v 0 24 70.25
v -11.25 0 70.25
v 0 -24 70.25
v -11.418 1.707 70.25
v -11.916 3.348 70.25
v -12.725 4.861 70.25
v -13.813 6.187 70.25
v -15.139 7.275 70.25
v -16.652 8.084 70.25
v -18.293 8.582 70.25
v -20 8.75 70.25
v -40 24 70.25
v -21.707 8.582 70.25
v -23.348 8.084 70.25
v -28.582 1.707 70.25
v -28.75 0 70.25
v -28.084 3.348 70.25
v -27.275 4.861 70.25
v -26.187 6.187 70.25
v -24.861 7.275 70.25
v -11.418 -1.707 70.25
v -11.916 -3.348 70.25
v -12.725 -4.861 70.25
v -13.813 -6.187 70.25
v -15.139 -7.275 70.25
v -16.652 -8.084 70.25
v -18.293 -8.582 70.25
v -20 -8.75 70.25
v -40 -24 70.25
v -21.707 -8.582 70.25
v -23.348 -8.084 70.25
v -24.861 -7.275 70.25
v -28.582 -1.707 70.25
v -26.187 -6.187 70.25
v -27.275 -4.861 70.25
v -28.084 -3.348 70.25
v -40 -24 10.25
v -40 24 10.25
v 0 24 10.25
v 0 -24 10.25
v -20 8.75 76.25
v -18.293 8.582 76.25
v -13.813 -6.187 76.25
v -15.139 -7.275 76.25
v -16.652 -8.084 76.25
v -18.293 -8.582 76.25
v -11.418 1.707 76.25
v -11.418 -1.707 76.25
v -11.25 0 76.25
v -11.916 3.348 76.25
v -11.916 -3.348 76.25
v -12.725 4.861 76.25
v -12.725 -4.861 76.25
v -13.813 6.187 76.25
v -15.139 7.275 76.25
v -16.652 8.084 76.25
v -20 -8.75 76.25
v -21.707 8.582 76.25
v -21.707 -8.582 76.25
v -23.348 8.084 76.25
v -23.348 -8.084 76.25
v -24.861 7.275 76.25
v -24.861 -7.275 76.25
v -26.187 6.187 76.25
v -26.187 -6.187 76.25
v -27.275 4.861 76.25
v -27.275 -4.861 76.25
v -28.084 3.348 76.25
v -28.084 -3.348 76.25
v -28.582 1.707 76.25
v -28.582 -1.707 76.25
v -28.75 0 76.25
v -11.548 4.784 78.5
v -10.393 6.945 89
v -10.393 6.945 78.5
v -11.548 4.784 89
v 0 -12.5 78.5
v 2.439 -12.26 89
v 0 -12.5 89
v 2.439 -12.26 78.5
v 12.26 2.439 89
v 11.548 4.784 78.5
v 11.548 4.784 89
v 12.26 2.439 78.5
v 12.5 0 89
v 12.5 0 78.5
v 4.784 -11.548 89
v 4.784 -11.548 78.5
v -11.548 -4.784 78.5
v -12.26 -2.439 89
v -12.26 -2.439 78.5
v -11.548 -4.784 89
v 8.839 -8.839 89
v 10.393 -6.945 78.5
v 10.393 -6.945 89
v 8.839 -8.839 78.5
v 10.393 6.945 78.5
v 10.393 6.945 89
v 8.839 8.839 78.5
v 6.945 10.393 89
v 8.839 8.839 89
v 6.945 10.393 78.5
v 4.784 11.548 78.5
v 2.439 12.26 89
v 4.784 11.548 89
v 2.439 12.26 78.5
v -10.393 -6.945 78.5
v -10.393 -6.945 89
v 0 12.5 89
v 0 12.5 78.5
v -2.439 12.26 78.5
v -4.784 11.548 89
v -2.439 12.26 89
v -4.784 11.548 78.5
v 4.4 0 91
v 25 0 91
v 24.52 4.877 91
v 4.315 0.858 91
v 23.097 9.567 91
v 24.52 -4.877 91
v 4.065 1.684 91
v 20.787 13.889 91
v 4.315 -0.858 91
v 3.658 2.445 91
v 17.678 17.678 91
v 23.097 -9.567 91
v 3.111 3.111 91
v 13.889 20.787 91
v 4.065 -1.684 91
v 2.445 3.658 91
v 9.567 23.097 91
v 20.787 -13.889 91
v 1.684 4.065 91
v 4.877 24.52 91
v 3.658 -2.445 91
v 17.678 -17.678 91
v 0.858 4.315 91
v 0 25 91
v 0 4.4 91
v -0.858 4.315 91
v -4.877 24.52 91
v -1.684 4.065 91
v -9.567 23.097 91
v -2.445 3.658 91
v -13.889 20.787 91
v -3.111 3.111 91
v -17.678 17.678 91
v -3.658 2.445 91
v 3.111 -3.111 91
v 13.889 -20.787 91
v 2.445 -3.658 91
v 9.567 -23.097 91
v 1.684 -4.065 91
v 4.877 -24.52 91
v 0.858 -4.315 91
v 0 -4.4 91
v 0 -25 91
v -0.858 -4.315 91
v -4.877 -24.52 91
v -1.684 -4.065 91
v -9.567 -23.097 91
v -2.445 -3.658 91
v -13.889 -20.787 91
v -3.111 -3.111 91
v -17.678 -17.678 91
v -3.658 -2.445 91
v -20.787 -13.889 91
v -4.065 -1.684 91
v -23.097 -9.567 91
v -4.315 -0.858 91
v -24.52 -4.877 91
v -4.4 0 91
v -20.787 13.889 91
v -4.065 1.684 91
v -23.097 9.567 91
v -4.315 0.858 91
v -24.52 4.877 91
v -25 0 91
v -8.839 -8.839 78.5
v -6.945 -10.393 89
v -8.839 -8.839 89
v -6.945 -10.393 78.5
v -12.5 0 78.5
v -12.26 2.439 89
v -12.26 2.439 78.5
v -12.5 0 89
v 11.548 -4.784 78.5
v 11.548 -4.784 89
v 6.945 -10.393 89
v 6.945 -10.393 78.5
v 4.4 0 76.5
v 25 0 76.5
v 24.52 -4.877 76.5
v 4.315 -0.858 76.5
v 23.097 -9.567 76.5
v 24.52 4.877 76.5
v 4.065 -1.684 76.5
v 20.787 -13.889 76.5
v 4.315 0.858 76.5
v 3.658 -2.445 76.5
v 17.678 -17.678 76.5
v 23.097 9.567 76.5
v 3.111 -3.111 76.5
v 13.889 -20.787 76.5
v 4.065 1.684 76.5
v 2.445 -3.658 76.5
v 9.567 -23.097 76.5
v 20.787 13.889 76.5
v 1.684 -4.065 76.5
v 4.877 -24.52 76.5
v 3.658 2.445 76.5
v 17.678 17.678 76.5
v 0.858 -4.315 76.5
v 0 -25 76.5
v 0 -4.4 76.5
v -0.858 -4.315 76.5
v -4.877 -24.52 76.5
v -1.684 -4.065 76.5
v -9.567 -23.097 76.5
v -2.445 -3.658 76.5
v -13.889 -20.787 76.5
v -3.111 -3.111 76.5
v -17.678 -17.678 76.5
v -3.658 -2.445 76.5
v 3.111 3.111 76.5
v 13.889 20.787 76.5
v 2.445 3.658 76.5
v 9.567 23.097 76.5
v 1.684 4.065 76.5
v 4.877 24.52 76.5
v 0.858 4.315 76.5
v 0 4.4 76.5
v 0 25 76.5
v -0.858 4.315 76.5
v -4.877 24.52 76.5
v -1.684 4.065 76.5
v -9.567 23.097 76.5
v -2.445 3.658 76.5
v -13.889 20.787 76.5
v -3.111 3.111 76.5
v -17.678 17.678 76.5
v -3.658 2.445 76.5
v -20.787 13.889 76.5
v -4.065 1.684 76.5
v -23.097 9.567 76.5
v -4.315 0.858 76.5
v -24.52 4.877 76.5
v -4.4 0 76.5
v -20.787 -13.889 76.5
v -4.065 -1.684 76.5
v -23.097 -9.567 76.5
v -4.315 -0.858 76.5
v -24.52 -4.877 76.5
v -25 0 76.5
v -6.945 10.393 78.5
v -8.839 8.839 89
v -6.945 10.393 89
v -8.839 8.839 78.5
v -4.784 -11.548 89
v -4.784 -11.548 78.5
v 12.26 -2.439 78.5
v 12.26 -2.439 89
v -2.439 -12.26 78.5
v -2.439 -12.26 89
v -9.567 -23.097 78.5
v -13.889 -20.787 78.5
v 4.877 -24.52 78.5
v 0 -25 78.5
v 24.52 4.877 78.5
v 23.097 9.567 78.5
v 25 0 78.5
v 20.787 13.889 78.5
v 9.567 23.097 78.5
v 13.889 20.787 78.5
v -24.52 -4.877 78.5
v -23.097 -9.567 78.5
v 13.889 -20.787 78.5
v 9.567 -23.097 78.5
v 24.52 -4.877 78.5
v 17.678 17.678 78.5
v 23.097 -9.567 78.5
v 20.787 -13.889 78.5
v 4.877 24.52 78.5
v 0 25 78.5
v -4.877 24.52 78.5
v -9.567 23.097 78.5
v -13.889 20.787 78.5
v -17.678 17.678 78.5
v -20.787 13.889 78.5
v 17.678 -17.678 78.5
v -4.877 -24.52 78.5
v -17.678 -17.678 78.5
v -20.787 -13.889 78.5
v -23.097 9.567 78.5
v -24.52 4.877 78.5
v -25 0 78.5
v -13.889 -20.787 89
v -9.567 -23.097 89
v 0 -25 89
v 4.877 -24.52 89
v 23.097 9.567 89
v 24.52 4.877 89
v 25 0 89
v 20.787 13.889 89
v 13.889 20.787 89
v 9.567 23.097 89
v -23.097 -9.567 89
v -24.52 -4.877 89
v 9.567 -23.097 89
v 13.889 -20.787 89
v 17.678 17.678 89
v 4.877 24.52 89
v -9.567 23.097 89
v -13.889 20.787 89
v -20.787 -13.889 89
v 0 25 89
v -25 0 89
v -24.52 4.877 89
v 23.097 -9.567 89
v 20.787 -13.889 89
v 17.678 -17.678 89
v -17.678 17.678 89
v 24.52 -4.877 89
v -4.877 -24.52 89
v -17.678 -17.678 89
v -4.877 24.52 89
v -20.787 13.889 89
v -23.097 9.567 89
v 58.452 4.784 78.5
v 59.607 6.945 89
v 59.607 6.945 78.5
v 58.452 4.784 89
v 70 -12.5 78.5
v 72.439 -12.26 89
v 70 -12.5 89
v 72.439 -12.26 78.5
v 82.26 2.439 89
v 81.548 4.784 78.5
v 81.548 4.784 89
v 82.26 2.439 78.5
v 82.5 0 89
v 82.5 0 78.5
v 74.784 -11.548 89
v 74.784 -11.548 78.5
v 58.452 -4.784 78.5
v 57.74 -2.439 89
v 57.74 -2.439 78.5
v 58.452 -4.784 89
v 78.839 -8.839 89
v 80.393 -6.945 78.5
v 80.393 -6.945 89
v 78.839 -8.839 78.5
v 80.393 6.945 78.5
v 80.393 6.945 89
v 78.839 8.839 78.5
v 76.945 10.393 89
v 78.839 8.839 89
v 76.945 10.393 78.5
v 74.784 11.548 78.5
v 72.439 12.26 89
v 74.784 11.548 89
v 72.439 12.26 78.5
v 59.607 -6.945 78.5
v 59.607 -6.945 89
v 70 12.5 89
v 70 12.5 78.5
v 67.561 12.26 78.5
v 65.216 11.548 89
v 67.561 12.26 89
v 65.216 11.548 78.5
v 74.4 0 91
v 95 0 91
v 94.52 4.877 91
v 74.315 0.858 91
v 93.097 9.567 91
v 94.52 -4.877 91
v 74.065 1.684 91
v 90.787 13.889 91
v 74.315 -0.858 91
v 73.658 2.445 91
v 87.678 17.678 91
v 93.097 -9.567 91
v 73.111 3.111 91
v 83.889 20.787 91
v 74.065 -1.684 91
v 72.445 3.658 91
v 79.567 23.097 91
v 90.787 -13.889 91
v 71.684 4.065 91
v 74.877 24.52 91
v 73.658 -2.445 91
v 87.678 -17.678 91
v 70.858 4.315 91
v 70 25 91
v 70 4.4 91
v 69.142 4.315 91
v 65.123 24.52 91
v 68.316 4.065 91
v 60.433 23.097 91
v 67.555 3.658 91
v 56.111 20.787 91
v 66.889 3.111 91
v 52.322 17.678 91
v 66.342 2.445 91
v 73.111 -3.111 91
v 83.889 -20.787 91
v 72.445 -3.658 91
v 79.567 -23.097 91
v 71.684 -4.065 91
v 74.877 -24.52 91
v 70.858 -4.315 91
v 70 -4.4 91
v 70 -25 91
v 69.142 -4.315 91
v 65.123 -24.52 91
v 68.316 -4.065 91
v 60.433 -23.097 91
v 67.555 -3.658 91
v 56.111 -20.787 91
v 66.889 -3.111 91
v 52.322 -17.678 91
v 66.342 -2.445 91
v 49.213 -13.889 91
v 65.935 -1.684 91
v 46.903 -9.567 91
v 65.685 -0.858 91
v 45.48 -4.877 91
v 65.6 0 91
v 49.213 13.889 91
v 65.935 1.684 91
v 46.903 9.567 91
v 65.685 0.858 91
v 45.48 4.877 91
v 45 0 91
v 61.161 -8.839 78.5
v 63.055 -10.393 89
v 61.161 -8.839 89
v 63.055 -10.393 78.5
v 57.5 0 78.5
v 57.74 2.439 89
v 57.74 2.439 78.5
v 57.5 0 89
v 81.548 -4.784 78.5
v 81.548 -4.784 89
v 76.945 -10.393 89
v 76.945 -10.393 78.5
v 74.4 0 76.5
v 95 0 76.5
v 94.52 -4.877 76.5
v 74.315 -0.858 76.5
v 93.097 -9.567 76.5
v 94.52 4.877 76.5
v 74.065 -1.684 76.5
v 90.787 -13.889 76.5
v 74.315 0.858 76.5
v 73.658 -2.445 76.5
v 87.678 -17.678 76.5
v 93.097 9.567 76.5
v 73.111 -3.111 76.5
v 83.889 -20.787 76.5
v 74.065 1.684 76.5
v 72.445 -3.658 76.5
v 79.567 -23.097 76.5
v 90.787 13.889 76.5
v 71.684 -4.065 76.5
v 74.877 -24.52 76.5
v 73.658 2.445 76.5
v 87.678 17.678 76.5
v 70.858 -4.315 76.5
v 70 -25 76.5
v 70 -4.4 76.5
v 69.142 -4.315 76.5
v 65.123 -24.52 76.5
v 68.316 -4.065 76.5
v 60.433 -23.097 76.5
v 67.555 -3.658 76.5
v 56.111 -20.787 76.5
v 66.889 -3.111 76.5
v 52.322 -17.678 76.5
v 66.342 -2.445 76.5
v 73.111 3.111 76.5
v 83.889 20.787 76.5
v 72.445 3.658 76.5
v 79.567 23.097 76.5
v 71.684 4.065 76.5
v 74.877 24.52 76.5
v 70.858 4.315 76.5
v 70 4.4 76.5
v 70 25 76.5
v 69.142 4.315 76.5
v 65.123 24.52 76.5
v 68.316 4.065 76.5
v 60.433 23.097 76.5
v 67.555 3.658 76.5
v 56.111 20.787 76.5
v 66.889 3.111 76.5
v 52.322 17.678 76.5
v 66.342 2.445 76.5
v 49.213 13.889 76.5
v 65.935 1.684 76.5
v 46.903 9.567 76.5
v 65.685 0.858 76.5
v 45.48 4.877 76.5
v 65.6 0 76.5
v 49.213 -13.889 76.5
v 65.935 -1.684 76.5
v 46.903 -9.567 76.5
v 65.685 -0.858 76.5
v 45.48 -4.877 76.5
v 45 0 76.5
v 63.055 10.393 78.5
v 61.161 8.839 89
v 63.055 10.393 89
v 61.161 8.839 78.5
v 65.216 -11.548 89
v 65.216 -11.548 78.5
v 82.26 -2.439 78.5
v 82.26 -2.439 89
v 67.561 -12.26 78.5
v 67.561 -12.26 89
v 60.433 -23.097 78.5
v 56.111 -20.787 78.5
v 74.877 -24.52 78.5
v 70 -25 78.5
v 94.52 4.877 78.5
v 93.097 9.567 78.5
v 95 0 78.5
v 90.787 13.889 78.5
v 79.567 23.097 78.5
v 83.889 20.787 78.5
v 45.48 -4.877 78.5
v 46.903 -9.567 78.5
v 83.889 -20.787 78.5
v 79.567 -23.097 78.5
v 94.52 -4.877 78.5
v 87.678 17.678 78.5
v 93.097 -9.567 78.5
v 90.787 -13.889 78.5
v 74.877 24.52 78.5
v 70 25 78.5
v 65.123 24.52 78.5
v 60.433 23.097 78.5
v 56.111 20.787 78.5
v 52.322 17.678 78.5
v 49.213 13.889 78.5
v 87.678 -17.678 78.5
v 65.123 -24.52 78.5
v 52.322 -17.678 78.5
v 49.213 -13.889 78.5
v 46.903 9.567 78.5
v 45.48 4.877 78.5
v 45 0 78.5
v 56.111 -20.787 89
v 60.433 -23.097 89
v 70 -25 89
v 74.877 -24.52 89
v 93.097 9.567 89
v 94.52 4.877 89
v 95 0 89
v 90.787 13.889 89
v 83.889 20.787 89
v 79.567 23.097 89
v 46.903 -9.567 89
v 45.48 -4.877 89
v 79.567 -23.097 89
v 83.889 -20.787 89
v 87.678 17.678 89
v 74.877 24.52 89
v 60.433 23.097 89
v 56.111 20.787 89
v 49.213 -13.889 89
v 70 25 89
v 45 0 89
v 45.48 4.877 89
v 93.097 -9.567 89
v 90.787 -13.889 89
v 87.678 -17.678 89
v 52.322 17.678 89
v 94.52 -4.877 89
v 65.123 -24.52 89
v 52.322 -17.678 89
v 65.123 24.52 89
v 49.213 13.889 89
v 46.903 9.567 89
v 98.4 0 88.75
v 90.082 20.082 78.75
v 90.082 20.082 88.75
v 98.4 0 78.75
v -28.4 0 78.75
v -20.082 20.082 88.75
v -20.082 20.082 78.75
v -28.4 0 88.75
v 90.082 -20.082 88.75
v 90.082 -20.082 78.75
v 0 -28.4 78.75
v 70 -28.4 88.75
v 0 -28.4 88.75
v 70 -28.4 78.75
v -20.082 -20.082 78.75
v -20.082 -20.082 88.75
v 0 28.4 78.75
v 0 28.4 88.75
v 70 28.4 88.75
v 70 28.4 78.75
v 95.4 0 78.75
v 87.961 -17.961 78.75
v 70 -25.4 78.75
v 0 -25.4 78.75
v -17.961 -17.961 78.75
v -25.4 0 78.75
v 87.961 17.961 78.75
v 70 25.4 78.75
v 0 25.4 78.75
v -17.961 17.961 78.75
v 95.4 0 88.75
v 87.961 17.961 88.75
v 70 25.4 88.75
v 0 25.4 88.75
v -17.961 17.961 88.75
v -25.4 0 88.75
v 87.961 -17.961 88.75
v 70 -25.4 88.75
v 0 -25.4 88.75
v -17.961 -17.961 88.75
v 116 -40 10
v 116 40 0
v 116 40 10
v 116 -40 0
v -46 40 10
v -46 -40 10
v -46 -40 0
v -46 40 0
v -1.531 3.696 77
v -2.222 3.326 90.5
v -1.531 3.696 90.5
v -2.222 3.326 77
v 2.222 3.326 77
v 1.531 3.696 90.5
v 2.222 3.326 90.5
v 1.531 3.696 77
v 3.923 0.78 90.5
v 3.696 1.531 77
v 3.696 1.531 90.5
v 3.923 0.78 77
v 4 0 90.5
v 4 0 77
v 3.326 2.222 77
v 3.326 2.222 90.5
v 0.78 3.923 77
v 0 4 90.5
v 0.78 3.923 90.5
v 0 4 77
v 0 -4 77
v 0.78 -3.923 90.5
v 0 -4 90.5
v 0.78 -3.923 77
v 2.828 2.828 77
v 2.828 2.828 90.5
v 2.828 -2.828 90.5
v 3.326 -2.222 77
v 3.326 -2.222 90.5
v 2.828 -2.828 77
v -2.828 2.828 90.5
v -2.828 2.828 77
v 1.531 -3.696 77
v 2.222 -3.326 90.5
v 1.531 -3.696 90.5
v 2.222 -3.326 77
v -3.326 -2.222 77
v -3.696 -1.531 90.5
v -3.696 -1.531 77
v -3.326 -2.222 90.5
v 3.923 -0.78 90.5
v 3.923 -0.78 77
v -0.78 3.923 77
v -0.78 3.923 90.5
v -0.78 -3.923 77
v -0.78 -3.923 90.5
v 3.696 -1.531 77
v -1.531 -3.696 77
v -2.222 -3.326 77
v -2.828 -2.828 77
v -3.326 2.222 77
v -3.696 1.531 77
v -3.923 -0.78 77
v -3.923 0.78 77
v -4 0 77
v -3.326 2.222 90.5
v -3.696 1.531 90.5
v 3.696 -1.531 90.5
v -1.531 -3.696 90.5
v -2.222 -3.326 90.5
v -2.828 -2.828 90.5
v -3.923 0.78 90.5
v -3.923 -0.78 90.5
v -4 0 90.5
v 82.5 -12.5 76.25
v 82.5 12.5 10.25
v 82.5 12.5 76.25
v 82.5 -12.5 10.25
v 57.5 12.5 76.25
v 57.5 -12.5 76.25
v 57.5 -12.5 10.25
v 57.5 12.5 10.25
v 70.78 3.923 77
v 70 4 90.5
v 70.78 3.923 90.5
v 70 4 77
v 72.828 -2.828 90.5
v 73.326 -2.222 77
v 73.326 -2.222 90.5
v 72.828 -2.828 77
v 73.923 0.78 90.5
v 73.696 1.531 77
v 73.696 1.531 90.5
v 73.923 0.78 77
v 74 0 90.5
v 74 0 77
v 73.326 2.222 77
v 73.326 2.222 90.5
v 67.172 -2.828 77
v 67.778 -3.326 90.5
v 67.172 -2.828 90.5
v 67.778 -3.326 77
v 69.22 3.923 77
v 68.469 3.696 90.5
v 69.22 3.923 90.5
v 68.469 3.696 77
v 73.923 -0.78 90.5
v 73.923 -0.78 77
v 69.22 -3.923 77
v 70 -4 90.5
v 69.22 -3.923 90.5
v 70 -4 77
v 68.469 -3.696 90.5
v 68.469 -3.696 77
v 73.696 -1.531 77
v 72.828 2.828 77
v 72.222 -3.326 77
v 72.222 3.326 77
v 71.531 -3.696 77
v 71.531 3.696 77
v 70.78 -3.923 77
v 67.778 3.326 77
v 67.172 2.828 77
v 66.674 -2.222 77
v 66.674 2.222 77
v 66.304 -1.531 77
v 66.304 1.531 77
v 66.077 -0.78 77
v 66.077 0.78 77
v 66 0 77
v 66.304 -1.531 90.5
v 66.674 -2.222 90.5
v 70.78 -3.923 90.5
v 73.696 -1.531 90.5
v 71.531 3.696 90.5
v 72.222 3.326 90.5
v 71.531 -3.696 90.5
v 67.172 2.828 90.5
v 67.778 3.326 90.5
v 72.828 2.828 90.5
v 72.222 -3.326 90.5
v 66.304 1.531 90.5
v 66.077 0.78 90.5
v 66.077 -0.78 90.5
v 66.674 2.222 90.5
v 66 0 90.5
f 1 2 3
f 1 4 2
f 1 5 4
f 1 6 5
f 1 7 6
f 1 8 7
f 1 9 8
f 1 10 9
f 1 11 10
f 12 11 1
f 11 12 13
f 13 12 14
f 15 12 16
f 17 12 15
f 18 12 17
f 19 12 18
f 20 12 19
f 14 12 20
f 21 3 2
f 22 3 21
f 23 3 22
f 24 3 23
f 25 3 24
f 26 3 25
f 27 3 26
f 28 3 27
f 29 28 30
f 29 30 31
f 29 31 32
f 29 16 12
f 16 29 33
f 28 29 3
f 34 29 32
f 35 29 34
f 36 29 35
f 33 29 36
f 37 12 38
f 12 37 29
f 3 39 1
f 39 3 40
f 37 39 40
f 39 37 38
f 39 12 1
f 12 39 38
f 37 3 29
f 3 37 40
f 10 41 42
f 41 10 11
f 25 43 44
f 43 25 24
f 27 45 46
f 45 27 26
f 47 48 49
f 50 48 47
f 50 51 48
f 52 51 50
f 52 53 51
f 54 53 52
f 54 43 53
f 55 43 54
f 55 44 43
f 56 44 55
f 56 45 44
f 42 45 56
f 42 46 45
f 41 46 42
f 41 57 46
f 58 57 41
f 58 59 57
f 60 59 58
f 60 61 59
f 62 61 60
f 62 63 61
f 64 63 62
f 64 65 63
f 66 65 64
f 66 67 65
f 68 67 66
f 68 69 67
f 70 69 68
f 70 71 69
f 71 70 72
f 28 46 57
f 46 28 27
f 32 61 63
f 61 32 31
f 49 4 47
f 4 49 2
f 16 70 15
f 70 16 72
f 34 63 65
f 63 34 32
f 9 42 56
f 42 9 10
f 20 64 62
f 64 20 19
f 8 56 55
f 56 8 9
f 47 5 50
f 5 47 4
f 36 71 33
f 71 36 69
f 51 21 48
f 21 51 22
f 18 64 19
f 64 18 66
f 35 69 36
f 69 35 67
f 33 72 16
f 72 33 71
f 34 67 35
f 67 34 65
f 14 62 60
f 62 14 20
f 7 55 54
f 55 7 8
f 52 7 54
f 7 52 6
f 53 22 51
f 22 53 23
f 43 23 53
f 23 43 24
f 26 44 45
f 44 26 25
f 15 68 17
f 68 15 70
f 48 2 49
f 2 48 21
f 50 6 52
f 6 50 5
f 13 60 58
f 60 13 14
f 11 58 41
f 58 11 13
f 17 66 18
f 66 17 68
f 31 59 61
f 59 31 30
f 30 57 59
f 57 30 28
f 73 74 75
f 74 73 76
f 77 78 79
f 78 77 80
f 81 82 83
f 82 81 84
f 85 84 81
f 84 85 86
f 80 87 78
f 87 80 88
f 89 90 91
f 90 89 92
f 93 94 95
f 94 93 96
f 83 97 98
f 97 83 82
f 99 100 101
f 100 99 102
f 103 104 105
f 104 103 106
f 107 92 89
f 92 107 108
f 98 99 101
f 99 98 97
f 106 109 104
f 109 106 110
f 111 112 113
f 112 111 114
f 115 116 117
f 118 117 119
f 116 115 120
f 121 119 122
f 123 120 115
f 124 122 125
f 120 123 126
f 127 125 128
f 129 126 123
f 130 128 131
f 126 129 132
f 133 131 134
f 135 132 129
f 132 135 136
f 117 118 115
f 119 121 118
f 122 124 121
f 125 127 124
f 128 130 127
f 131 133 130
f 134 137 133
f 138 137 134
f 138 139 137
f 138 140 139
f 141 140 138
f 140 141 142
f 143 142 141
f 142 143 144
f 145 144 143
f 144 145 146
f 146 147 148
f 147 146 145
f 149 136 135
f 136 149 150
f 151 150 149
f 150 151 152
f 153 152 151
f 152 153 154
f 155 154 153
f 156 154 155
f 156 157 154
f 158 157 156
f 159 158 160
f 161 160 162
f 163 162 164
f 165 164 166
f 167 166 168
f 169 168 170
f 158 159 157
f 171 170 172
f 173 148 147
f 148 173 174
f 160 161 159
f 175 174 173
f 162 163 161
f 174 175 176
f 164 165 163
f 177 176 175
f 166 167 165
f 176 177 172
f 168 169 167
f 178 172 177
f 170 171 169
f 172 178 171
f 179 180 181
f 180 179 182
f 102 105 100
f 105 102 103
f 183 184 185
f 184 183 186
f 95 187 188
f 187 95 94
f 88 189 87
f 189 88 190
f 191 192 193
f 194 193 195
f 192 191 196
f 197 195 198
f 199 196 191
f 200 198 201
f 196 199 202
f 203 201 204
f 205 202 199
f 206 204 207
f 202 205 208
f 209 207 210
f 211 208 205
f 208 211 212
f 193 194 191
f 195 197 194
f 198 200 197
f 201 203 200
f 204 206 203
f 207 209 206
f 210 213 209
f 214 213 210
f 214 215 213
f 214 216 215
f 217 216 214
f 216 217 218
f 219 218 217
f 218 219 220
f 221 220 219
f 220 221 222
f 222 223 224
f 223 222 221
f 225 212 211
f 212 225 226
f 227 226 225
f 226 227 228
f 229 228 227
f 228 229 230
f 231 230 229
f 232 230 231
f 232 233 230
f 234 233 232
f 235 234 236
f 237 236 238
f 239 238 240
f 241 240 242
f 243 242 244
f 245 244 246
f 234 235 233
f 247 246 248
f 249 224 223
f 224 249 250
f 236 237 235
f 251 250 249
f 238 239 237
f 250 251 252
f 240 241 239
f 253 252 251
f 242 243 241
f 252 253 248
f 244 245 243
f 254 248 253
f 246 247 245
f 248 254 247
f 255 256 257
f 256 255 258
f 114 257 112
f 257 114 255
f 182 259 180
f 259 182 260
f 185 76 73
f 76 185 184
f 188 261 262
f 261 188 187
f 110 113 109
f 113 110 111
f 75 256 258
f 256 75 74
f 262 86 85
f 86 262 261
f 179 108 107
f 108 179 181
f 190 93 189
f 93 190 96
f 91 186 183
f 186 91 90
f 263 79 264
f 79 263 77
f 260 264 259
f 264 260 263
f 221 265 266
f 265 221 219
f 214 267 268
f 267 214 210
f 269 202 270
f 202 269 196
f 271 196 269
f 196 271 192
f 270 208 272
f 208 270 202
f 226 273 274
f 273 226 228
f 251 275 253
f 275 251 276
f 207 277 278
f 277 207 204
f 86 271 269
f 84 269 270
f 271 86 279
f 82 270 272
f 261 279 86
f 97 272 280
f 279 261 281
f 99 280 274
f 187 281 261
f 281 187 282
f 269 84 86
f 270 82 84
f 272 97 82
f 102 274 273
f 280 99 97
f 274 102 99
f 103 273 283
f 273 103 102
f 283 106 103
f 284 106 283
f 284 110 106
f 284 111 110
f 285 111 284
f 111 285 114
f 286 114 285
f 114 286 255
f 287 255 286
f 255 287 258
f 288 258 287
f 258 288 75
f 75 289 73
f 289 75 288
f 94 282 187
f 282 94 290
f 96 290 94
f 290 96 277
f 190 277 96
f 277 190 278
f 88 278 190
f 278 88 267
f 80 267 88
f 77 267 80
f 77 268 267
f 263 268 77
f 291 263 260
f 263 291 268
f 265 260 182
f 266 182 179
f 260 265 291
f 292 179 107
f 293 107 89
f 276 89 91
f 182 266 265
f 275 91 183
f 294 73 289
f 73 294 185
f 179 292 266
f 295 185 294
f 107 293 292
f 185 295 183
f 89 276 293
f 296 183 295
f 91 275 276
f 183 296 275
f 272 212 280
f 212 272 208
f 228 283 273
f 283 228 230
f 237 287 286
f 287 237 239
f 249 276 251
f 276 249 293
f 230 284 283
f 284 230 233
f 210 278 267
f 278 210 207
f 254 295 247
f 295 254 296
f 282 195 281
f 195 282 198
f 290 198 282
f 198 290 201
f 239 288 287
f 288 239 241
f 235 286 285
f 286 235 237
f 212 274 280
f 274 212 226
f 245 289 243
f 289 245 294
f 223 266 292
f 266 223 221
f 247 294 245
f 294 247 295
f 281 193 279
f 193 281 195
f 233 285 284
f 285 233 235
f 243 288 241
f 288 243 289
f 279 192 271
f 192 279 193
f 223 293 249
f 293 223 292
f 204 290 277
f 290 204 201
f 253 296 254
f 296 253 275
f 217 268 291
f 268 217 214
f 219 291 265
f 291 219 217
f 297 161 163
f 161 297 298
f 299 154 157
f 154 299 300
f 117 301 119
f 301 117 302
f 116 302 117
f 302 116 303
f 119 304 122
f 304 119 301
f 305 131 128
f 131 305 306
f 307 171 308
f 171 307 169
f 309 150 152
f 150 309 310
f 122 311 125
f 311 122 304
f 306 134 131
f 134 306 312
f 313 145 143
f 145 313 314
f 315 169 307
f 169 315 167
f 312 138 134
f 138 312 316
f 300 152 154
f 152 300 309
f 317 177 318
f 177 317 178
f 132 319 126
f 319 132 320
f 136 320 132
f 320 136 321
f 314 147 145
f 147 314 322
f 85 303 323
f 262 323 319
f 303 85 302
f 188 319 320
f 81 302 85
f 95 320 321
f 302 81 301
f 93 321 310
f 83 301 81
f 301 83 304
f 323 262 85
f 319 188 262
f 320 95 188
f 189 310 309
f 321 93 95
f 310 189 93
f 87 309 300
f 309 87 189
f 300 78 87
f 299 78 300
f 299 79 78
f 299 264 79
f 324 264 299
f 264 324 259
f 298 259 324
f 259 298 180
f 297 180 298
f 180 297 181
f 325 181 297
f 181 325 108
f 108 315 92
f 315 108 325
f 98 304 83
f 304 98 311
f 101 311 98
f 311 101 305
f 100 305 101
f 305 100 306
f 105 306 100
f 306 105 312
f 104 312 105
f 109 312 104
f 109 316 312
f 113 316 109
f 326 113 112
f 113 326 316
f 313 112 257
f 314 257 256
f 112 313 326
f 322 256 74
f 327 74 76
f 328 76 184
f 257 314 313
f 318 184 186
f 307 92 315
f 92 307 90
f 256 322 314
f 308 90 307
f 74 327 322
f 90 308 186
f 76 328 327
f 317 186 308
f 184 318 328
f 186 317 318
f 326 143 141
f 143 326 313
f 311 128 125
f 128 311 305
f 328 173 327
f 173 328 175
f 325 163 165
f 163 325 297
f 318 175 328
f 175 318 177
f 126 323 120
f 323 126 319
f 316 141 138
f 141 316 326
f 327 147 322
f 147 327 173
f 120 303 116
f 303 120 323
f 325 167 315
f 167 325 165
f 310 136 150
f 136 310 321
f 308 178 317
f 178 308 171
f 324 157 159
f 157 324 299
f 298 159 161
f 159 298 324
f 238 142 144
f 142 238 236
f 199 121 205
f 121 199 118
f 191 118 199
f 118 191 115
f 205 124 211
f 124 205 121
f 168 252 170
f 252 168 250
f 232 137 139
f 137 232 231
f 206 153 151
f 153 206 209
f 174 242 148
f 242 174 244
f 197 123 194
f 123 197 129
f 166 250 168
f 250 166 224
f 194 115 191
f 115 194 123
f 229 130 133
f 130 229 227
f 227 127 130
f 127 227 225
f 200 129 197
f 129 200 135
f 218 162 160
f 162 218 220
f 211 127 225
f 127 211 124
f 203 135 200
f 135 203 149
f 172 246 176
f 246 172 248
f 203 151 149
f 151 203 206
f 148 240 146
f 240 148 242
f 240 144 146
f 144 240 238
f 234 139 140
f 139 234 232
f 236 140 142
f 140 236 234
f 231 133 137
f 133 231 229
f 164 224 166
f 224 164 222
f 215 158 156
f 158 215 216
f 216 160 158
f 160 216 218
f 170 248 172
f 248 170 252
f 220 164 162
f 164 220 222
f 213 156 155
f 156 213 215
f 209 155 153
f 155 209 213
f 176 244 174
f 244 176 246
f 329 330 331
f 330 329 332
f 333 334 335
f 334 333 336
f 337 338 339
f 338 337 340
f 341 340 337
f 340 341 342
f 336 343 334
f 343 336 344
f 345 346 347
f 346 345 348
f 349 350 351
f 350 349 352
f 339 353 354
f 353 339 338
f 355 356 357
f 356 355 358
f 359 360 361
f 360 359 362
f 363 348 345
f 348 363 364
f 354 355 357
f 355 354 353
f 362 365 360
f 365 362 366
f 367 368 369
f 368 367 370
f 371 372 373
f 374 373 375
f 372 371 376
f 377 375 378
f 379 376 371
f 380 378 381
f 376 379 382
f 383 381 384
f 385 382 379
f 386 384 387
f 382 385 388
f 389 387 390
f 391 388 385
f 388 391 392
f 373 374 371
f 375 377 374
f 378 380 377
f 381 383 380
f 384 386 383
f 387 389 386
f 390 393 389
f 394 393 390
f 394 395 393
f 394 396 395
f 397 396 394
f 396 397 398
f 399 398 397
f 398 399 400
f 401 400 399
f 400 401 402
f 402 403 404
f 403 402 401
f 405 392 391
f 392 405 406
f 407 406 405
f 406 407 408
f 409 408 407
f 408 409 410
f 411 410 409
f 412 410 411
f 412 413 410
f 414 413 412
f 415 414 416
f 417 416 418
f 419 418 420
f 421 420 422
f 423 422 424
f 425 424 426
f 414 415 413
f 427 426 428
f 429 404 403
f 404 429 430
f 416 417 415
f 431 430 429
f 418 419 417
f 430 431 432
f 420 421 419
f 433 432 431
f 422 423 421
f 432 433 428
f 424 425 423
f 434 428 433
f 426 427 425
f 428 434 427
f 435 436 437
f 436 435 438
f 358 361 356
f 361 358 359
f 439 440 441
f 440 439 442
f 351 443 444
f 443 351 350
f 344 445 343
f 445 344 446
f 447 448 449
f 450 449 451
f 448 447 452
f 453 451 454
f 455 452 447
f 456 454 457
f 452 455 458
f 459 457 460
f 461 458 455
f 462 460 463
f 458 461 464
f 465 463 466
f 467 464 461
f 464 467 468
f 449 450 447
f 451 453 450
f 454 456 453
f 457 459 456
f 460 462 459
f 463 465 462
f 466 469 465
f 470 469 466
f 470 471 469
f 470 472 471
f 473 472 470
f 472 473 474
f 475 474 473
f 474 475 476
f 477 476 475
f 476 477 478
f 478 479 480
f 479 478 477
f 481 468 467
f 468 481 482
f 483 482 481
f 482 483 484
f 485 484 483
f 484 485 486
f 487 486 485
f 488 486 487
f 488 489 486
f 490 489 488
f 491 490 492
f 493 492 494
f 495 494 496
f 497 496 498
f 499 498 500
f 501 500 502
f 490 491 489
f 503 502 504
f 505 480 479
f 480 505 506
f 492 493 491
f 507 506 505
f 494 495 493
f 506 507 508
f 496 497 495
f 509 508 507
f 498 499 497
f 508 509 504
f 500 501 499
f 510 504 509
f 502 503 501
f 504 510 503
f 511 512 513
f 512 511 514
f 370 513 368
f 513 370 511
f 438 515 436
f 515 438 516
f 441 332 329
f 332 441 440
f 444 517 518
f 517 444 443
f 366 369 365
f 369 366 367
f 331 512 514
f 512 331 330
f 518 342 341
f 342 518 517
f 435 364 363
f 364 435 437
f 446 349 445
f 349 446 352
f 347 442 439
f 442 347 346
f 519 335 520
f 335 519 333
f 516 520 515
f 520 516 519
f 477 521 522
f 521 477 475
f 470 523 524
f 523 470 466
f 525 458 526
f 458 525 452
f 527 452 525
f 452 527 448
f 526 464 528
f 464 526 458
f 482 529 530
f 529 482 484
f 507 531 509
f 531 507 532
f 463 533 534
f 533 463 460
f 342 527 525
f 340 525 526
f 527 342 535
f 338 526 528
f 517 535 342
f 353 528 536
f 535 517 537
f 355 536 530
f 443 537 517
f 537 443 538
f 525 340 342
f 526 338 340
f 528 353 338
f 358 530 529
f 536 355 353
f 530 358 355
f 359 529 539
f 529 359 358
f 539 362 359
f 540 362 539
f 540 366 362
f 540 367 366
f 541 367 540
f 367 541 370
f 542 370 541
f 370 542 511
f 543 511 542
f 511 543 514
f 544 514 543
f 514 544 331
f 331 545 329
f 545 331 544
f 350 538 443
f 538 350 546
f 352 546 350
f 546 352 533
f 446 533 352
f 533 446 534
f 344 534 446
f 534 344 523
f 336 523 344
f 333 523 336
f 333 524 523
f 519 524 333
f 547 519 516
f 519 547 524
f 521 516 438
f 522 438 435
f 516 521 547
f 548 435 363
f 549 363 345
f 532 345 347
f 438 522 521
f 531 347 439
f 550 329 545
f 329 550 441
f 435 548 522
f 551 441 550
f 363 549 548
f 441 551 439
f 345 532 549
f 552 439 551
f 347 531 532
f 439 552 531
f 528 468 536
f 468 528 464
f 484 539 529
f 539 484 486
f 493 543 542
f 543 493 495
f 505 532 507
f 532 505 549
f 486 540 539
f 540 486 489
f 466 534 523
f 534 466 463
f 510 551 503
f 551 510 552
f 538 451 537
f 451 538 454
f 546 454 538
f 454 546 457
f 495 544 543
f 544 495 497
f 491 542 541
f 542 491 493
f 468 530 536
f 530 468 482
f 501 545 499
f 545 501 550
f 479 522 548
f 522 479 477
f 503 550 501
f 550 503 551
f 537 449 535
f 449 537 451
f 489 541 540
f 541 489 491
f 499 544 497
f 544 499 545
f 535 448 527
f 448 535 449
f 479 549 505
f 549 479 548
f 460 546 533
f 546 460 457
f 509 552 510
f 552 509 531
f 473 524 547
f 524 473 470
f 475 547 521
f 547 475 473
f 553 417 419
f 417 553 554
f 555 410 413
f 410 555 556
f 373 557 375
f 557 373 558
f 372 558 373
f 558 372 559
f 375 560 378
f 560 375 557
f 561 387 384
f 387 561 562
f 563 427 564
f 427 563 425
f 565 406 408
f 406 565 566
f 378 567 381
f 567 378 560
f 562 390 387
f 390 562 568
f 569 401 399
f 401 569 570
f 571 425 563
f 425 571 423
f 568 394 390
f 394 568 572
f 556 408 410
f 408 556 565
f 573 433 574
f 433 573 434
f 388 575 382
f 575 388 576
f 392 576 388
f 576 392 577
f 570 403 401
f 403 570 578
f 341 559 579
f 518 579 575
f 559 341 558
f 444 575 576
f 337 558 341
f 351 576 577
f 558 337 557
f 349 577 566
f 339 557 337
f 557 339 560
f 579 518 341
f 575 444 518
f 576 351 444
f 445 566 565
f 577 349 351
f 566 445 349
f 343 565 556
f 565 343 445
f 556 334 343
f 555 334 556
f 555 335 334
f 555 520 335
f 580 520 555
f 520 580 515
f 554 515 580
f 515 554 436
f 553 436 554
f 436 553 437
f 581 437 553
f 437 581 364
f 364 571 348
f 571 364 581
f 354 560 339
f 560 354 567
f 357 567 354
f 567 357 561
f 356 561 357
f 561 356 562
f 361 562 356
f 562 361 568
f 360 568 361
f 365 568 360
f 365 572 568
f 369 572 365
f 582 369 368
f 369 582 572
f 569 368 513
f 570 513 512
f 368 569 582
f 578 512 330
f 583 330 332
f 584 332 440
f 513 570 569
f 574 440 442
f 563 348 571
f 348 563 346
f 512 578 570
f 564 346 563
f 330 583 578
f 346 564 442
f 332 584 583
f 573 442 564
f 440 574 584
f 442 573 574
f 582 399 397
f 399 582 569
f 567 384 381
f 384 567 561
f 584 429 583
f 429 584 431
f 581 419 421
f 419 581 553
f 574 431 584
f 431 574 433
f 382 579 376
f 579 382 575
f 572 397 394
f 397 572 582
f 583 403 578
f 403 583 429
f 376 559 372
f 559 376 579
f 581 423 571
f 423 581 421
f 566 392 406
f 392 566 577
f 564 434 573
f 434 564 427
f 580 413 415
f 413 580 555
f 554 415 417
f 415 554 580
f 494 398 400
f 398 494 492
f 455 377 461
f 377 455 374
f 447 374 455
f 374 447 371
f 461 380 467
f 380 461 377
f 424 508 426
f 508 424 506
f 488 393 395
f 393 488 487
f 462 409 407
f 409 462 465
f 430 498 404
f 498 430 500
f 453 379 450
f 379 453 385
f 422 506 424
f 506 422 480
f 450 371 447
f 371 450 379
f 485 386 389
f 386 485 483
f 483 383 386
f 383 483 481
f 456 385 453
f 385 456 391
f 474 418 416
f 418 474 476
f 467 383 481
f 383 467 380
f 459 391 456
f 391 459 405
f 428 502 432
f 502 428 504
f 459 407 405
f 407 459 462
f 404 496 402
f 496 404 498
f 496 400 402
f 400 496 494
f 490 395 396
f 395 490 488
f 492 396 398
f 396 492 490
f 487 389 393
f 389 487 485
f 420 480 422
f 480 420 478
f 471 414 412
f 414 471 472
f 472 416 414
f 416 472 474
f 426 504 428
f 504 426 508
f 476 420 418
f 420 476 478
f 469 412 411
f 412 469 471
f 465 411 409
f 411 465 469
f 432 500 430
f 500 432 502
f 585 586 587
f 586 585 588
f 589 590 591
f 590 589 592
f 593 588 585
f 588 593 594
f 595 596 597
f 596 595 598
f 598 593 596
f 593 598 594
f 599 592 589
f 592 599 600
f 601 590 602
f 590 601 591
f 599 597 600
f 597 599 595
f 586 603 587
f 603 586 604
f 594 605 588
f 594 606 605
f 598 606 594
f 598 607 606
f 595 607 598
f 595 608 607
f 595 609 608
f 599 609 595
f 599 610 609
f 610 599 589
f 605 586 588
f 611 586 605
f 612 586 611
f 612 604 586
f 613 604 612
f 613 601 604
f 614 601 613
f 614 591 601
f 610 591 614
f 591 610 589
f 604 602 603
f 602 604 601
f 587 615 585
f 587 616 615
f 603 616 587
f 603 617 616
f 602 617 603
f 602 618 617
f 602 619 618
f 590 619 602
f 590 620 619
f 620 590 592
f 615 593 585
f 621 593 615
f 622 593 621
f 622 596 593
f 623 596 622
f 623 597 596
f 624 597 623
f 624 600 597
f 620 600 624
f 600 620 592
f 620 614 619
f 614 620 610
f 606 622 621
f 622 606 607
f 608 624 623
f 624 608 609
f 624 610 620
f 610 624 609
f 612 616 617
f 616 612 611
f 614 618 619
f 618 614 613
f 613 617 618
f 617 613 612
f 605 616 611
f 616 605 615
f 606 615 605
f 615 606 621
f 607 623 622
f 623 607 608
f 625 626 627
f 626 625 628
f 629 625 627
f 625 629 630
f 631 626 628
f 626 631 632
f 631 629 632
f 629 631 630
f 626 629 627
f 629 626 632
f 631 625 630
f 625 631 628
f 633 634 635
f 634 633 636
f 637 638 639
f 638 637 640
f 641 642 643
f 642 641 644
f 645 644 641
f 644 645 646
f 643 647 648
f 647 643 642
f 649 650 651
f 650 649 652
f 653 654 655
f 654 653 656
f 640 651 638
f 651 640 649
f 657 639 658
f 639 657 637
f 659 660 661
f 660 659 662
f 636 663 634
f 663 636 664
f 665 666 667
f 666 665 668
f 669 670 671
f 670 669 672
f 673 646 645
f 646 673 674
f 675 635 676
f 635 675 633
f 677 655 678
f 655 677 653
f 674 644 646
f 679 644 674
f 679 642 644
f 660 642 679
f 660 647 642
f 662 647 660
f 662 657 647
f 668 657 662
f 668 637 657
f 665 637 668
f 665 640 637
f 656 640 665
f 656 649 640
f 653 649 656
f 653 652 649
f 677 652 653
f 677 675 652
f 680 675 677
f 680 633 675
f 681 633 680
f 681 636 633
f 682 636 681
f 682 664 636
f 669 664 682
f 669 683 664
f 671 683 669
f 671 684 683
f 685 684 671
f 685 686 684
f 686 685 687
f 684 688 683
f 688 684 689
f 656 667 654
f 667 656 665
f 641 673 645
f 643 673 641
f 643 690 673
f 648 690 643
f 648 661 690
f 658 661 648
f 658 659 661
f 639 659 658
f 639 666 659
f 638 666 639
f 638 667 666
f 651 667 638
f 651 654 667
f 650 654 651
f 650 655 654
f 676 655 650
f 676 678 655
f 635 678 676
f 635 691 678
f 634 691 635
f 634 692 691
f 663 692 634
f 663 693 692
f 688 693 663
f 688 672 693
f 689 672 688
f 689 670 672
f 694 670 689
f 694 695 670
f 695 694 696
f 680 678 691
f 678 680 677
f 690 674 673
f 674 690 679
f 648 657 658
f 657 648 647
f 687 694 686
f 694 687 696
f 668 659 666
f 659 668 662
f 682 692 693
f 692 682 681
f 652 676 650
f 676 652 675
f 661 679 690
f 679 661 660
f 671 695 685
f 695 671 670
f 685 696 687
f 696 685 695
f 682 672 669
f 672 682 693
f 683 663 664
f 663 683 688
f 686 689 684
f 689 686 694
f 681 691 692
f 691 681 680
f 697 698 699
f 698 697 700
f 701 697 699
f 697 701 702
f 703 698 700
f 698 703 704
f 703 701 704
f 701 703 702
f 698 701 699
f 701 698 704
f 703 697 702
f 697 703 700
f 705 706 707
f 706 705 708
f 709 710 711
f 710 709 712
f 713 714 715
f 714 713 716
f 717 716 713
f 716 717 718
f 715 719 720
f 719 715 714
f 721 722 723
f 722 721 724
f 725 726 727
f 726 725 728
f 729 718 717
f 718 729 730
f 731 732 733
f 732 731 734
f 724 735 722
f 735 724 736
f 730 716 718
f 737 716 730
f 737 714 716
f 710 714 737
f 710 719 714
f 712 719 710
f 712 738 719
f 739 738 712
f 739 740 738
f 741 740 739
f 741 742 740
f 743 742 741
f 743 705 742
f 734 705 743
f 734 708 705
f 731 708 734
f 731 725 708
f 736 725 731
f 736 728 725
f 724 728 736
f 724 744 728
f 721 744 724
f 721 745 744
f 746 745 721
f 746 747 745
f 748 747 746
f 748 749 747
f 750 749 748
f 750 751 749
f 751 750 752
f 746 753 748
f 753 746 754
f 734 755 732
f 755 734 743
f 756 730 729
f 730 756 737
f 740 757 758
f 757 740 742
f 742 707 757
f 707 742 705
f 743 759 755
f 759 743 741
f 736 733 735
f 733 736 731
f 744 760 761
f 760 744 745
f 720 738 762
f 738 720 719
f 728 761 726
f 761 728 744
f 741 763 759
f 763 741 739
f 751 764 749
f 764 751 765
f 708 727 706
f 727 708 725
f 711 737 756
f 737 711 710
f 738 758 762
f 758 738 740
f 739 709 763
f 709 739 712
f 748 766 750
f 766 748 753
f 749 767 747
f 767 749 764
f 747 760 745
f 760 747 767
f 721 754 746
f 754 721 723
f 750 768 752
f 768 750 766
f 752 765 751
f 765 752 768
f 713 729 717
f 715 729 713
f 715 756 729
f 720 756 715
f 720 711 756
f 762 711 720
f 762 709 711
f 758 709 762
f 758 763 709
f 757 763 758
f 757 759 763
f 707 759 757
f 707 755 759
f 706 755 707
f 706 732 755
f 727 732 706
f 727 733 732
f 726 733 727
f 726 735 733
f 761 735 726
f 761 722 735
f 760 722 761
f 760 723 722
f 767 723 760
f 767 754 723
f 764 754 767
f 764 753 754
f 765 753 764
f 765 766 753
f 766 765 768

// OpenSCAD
$fn = 32;

// ------------------------------------------------------------------------
// Motor belt drive: span 70 mm, pulleys d50, belt 10 mm wide
// Every part is its own module, assembly() places every instance.
// ------------------------------------------------------------------------

// --- part 1 ---
module base_plate() {
  difference() {
    translate([-81, -40, 0]) cube([162, 80, 10]);
  }
}

// --- part 2 ---
module motor() {
  union() {
    translate([-30, -24, 0]) cube([60, 48, 40]);
    translate([33, 0, 20]) rotate([0, 90, 0]) cylinder(h = 6, d = 17.5, center = true);
  }
}

// --- part 3 ---
module drive_shaft() {
  translate([0, 0, -6.75]) cylinder(h = 13.5, d = 8);
}

// --- part 4 ---
module pulley_drive() {
  difference() {
    union() {
      cylinder(h = 14.5, d = 25);
      cylinder(h = 2, d = 50);
      translate([0, 0, 12.5]) cylinder(h = 2, d = 50);
    }
    translate([0, 0, -1]) cylinder(h = 16.5, d = 8.8);
  }
}

// --- part 5 ---
module idler_post() {
  translate([-12.5, -12.5, 0]) cube([25, 25, 66]);
}

// --- part 6 ---
module driven_shaft() {
  translate([0, 0, -6.75]) cylinder(h = 13.5, d = 8);
}

// --- part 7 ---
module pulley_driven() {
  difference() {
    union() {
      cylinder(h = 14.5, d = 25);
      cylinder(h = 2, d = 50);
      translate([0, 0, 12.5]) cylinder(h = 2, d = 50);
    }
    translate([0, 0, -1]) cylinder(h = 16.5, d = 8.8);
  }
}

// --- part 8 ---
module drive_belt() {
  difference() {
    linear_extrude(height = 10) polygon(points = concat([for (a = [90 : 45 : 270]) [28.4 * cos(a), 28.4 * sin(a)]], [for (a = [270 : 45 : 450]) [70 + 28.4 * cos(a), 28.4 * sin(a)]]));
    translate([0, 0, -1]) linear_extrude(height = 12) polygon(points = concat([for (a = [90 : 45 : 270]) [25.4 * cos(a), 25.4 * sin(a)]], [for (a = [270 : 45 : 450]) [70 + 25.4 * cos(a), 25.4 * sin(a)]]));
  }
}

// --- assembly ---
module assembly() {
  color([0.80, 0.24, 0.20]) translate([35, 0, 0]) rotate([0, 0, 0]) base_plate();
  color([0.20, 0.45, 0.75]) translate([0, 0, 40.25]) rotate([0, 270, 0]) motor();
  color([0.25, 0.62, 0.32]) translate([0, 0, 83.75]) rotate([0, 0, 0]) drive_shaft();
  color([0.92, 0.70, 0.18]) translate([0, 0, 76.5]) rotate([0, 0, 0]) pulley_drive();
  color([0.58, 0.35, 0.70]) translate([70, 0, 10.25]) rotate([0, 0, 0]) idler_post();
  color([0.16, 0.66, 0.66]) translate([70, 0, 83.75]) rotate([0, 0, 0]) driven_shaft();
  color([0.85, 0.48, 0.18]) translate([70, 0, 76.5]) rotate([0, 0, 0]) pulley_driven();
  color([0.55, 0.60, 0.65]) translate([0, 0, 78.75]) rotate([0, 0, 0]) drive_belt();
}

assembly();
